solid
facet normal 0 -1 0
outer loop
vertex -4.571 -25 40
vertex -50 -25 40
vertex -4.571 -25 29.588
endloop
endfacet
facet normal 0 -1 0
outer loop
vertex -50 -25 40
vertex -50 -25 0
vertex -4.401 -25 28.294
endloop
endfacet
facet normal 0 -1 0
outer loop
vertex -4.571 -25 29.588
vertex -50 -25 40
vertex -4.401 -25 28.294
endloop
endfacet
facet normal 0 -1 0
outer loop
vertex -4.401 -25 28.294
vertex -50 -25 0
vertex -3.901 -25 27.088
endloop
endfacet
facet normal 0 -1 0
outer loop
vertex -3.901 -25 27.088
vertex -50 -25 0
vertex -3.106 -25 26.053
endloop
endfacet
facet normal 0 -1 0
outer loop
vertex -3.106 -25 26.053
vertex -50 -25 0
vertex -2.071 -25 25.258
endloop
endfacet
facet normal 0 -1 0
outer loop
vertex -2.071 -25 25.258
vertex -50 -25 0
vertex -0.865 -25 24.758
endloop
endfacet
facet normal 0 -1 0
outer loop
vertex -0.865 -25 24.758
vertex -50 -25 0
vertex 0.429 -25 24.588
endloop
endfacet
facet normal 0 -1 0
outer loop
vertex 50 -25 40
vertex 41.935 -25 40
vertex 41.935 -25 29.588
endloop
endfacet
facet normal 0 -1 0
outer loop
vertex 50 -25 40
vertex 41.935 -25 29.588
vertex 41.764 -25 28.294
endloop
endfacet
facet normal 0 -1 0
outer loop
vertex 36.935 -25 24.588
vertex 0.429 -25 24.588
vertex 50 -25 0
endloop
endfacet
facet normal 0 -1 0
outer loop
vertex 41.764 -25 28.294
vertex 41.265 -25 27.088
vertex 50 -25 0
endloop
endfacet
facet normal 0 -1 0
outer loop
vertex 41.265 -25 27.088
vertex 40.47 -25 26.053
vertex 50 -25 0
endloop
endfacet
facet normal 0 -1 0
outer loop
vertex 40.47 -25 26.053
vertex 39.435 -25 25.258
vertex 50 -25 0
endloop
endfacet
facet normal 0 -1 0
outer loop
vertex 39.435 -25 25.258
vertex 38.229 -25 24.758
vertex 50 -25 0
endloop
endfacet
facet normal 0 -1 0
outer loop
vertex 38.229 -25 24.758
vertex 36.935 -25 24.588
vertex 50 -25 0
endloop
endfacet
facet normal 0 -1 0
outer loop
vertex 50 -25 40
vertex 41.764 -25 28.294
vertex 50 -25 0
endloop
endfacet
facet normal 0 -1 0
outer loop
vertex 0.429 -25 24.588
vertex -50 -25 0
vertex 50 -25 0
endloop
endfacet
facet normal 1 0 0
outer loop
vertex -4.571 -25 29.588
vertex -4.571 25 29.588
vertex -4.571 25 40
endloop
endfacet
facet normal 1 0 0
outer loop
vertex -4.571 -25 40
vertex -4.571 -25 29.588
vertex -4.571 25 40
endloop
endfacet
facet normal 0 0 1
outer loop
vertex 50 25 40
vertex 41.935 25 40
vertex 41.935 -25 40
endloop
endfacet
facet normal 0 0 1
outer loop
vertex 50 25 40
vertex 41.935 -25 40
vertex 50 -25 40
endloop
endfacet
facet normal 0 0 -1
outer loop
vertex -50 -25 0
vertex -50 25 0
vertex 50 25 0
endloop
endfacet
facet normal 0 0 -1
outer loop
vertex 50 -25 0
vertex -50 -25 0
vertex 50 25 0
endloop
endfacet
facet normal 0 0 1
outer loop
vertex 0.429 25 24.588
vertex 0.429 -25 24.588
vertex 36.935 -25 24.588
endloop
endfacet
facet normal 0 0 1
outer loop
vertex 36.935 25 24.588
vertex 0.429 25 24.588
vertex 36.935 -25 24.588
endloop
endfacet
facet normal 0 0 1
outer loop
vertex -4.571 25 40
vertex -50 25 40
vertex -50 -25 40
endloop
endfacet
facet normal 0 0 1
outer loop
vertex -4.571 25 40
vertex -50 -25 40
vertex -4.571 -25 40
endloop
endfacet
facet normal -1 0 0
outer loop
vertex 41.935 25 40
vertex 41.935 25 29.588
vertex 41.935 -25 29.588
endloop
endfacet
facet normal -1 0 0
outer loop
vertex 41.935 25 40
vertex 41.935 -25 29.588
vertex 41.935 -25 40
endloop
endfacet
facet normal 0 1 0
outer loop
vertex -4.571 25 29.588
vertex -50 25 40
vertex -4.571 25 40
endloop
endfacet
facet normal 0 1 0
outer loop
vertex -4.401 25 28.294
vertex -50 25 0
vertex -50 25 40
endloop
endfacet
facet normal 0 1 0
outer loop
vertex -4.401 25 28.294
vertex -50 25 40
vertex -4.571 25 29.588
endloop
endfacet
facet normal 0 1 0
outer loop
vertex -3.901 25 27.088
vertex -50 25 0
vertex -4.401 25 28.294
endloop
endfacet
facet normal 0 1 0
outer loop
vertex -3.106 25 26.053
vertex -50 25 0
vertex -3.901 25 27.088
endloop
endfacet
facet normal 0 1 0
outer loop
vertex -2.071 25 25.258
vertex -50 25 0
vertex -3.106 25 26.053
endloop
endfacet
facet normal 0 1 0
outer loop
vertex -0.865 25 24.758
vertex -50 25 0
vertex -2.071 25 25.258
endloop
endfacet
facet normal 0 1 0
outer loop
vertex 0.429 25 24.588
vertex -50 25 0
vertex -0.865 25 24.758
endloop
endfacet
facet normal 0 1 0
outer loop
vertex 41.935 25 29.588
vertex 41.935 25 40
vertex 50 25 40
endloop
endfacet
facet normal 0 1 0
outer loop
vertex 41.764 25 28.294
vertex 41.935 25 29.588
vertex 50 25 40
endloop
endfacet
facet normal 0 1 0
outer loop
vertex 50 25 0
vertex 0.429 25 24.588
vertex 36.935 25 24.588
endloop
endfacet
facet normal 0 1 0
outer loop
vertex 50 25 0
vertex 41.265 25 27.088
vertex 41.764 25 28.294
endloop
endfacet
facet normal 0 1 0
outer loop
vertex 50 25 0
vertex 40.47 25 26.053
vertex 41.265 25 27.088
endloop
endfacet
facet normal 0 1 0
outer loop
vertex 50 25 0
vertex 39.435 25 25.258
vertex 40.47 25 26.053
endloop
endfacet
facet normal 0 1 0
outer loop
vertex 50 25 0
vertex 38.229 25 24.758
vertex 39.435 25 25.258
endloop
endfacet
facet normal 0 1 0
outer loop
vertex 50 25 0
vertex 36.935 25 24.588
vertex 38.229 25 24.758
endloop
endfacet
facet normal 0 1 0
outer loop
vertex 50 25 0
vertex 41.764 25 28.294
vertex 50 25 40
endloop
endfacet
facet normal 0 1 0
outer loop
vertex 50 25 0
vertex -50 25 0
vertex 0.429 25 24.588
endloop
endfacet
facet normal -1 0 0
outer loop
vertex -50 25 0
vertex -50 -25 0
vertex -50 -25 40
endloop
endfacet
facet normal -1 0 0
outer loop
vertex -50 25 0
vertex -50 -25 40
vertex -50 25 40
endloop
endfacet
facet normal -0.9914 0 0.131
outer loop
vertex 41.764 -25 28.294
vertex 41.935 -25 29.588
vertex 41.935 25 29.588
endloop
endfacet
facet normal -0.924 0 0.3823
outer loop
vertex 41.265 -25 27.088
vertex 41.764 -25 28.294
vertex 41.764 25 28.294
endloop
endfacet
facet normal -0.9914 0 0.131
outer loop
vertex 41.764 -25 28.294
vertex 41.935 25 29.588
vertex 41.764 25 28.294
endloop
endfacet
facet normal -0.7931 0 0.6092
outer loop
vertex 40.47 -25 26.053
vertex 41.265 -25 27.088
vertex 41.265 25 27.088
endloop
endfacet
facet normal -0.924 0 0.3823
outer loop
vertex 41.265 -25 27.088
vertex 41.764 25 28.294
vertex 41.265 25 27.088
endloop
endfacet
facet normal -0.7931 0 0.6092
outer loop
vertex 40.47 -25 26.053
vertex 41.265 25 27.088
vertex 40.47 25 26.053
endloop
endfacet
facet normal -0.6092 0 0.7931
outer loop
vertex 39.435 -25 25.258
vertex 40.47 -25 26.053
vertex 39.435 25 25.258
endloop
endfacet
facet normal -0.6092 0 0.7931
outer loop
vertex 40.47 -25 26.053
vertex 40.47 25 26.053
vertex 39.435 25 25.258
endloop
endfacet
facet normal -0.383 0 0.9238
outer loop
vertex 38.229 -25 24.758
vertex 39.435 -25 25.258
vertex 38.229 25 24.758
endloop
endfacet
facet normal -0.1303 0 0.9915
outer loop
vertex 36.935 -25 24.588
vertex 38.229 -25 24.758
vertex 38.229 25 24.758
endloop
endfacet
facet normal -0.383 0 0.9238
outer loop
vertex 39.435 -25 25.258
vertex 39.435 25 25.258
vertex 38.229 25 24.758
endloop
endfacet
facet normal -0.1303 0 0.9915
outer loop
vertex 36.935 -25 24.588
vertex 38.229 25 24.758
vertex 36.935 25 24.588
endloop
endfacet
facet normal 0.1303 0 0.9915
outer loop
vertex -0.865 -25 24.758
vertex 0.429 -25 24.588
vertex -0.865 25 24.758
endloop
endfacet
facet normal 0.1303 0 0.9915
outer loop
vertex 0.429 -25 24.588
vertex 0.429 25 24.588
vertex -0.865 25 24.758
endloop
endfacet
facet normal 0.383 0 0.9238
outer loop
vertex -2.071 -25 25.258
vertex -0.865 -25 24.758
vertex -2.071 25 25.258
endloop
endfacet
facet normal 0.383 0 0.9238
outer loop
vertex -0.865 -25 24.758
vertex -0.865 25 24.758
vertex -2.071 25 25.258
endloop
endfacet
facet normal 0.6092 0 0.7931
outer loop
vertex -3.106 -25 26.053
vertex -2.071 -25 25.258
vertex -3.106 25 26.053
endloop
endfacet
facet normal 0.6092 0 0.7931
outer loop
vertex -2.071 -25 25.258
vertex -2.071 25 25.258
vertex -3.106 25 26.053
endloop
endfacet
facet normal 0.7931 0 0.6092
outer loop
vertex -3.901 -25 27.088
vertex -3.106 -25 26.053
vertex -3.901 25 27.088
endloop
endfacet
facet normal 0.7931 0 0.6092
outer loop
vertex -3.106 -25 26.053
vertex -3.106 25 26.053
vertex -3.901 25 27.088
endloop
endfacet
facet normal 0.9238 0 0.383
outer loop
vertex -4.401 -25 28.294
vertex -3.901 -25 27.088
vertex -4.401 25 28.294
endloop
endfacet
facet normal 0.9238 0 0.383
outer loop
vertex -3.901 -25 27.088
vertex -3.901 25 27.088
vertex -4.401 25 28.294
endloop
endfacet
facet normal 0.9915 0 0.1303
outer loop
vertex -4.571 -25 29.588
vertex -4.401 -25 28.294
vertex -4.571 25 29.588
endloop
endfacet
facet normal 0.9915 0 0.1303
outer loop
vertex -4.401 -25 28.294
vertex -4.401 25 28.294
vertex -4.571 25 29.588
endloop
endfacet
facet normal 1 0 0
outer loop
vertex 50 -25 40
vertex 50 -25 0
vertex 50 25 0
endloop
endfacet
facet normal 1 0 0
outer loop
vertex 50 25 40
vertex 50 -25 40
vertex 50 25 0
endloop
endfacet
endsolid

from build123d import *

# Parameters (mm, degrees)
F0_W     = 100
F0_H     = 50
F1_DEPTH = 40
F2_W     = 46.505556
F2_H     = 30.397546
F3_DEPTH = 99
F4_R     = 5


with BuildPart() as f1:
    # F0 (on Top) → F1 (new body)
    with BuildSketch(Plane.XY):
        Rectangle(F0_W, F0_H)
    extrude(amount=F1_DEPTH)

    # F2 (on face) → F3 (cut)
    with BuildSketch(Plane.XZ.offset(25)):
        with Locations((18.68185, 39.786866)):
            Rectangle(F2_W, F2_H)
    extrude(amount=-F3_DEPTH, mode=Mode.SUBTRACT)

    # F4
    f4_edges = [f1.edges().sort_by_distance(p)[0] for p in [
        (-4.570928, 0, 24.588093),
        (41.934628, 0, 24.588093),
    ]]
    fillet(f4_edges, radius=F4_R)


solid = f1.part
